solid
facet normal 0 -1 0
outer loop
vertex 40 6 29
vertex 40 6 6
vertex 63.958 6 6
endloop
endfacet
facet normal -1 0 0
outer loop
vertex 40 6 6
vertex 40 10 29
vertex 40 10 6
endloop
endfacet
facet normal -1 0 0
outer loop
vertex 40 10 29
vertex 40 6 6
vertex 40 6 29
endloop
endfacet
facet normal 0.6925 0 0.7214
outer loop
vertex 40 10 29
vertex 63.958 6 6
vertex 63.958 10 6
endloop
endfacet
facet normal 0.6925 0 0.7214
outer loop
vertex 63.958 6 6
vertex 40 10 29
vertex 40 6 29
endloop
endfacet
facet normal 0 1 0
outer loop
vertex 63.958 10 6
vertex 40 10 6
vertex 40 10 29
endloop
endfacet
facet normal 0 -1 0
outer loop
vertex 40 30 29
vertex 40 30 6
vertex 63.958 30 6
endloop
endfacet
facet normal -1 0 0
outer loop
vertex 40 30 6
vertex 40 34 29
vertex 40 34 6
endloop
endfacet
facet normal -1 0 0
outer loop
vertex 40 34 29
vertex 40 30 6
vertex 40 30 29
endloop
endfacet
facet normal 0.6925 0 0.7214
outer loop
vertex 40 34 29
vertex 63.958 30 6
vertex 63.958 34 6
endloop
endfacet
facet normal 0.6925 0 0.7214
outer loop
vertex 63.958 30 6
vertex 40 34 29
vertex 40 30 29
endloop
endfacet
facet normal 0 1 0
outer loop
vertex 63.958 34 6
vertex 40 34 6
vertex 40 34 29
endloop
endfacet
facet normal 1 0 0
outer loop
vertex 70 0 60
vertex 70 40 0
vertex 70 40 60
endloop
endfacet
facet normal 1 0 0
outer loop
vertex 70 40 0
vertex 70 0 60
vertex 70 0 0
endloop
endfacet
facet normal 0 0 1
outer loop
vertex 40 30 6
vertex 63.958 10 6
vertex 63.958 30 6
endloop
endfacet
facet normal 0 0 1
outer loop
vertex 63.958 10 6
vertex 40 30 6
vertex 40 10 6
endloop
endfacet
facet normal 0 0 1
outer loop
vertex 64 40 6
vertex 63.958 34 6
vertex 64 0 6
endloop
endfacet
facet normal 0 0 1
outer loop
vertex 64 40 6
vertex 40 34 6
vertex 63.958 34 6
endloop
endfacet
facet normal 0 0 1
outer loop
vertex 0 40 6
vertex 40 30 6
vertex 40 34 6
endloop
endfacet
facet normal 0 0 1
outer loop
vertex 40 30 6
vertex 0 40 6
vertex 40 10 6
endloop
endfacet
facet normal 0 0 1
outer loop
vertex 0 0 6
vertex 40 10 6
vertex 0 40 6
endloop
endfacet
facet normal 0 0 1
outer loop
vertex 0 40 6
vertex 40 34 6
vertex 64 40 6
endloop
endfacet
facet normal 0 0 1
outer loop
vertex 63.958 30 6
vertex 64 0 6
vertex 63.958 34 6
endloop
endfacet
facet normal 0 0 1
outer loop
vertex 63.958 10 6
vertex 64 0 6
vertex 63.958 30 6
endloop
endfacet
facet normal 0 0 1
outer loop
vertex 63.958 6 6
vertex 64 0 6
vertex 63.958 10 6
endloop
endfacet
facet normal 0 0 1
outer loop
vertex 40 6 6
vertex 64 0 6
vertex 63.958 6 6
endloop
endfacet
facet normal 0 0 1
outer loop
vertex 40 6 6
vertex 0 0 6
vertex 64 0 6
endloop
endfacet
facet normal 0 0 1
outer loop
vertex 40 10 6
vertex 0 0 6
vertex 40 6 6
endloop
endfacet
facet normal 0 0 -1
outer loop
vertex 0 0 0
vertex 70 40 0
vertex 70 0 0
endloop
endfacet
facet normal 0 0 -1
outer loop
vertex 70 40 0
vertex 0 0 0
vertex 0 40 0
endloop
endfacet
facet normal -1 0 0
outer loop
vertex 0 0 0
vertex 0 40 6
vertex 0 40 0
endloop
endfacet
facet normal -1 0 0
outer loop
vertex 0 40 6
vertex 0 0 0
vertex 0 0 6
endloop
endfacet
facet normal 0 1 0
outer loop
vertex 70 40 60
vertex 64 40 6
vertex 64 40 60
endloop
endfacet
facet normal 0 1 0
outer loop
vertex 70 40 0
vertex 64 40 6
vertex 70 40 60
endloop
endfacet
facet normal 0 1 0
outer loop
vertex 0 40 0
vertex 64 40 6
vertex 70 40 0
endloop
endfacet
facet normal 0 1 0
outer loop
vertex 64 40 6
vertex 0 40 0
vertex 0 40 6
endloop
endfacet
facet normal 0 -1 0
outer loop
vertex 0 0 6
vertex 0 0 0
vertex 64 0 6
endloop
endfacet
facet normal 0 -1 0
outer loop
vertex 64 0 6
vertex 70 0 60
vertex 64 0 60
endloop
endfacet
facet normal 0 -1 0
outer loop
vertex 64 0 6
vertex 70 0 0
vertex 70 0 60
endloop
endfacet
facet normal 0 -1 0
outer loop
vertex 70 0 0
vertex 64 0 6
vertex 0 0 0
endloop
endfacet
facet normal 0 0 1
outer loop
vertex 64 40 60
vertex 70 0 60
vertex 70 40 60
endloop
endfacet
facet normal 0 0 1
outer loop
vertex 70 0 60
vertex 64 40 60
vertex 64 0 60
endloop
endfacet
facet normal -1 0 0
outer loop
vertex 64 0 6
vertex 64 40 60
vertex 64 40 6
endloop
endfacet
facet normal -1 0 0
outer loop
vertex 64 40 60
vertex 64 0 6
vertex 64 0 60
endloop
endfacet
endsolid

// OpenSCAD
$fn = 32;

// ----------------------------------------------------------------------
// Rib bracket: 2-gusset L bracket
// ----------------------------------------------------------------------

// --- parameters (mm) ---
base_l = 70;              // foot length, X
base_w = 40;              // foot width, Y
base_t = 6;               // foot thickness
plate_t = 6;              // upright plate thickness
plate_h = 60;             // overall height
gus_l = 24;               // gusset leg along the foot
gus_h = 24;               // gusset height
gus_t = 4;                // gusset thickness
gus_edge = 6;             // gusset margin from the foot edge
n_gus = 2;                // gusset count

gus_pitch = (base_w - 2 * gus_edge - gus_t) / (n_gus - 1);  // gusset pitch

union() {
  cube([base_l, base_w, base_t]);
  translate([base_l - plate_t, 0, base_t - 1])
    cube([plate_t, base_w, plate_h - base_t + 1]);
  for (i = [0 : n_gus - 1])
    translate([base_l - plate_t - gus_l, gus_edge + i * gus_pitch, base_t - 1])
      rotate([-90, 0, 0])
        linear_extrude(height = gus_t)
          polygon(points = [[0, 0], [gus_l + 1, 0], [0, -gus_h]]);
}
